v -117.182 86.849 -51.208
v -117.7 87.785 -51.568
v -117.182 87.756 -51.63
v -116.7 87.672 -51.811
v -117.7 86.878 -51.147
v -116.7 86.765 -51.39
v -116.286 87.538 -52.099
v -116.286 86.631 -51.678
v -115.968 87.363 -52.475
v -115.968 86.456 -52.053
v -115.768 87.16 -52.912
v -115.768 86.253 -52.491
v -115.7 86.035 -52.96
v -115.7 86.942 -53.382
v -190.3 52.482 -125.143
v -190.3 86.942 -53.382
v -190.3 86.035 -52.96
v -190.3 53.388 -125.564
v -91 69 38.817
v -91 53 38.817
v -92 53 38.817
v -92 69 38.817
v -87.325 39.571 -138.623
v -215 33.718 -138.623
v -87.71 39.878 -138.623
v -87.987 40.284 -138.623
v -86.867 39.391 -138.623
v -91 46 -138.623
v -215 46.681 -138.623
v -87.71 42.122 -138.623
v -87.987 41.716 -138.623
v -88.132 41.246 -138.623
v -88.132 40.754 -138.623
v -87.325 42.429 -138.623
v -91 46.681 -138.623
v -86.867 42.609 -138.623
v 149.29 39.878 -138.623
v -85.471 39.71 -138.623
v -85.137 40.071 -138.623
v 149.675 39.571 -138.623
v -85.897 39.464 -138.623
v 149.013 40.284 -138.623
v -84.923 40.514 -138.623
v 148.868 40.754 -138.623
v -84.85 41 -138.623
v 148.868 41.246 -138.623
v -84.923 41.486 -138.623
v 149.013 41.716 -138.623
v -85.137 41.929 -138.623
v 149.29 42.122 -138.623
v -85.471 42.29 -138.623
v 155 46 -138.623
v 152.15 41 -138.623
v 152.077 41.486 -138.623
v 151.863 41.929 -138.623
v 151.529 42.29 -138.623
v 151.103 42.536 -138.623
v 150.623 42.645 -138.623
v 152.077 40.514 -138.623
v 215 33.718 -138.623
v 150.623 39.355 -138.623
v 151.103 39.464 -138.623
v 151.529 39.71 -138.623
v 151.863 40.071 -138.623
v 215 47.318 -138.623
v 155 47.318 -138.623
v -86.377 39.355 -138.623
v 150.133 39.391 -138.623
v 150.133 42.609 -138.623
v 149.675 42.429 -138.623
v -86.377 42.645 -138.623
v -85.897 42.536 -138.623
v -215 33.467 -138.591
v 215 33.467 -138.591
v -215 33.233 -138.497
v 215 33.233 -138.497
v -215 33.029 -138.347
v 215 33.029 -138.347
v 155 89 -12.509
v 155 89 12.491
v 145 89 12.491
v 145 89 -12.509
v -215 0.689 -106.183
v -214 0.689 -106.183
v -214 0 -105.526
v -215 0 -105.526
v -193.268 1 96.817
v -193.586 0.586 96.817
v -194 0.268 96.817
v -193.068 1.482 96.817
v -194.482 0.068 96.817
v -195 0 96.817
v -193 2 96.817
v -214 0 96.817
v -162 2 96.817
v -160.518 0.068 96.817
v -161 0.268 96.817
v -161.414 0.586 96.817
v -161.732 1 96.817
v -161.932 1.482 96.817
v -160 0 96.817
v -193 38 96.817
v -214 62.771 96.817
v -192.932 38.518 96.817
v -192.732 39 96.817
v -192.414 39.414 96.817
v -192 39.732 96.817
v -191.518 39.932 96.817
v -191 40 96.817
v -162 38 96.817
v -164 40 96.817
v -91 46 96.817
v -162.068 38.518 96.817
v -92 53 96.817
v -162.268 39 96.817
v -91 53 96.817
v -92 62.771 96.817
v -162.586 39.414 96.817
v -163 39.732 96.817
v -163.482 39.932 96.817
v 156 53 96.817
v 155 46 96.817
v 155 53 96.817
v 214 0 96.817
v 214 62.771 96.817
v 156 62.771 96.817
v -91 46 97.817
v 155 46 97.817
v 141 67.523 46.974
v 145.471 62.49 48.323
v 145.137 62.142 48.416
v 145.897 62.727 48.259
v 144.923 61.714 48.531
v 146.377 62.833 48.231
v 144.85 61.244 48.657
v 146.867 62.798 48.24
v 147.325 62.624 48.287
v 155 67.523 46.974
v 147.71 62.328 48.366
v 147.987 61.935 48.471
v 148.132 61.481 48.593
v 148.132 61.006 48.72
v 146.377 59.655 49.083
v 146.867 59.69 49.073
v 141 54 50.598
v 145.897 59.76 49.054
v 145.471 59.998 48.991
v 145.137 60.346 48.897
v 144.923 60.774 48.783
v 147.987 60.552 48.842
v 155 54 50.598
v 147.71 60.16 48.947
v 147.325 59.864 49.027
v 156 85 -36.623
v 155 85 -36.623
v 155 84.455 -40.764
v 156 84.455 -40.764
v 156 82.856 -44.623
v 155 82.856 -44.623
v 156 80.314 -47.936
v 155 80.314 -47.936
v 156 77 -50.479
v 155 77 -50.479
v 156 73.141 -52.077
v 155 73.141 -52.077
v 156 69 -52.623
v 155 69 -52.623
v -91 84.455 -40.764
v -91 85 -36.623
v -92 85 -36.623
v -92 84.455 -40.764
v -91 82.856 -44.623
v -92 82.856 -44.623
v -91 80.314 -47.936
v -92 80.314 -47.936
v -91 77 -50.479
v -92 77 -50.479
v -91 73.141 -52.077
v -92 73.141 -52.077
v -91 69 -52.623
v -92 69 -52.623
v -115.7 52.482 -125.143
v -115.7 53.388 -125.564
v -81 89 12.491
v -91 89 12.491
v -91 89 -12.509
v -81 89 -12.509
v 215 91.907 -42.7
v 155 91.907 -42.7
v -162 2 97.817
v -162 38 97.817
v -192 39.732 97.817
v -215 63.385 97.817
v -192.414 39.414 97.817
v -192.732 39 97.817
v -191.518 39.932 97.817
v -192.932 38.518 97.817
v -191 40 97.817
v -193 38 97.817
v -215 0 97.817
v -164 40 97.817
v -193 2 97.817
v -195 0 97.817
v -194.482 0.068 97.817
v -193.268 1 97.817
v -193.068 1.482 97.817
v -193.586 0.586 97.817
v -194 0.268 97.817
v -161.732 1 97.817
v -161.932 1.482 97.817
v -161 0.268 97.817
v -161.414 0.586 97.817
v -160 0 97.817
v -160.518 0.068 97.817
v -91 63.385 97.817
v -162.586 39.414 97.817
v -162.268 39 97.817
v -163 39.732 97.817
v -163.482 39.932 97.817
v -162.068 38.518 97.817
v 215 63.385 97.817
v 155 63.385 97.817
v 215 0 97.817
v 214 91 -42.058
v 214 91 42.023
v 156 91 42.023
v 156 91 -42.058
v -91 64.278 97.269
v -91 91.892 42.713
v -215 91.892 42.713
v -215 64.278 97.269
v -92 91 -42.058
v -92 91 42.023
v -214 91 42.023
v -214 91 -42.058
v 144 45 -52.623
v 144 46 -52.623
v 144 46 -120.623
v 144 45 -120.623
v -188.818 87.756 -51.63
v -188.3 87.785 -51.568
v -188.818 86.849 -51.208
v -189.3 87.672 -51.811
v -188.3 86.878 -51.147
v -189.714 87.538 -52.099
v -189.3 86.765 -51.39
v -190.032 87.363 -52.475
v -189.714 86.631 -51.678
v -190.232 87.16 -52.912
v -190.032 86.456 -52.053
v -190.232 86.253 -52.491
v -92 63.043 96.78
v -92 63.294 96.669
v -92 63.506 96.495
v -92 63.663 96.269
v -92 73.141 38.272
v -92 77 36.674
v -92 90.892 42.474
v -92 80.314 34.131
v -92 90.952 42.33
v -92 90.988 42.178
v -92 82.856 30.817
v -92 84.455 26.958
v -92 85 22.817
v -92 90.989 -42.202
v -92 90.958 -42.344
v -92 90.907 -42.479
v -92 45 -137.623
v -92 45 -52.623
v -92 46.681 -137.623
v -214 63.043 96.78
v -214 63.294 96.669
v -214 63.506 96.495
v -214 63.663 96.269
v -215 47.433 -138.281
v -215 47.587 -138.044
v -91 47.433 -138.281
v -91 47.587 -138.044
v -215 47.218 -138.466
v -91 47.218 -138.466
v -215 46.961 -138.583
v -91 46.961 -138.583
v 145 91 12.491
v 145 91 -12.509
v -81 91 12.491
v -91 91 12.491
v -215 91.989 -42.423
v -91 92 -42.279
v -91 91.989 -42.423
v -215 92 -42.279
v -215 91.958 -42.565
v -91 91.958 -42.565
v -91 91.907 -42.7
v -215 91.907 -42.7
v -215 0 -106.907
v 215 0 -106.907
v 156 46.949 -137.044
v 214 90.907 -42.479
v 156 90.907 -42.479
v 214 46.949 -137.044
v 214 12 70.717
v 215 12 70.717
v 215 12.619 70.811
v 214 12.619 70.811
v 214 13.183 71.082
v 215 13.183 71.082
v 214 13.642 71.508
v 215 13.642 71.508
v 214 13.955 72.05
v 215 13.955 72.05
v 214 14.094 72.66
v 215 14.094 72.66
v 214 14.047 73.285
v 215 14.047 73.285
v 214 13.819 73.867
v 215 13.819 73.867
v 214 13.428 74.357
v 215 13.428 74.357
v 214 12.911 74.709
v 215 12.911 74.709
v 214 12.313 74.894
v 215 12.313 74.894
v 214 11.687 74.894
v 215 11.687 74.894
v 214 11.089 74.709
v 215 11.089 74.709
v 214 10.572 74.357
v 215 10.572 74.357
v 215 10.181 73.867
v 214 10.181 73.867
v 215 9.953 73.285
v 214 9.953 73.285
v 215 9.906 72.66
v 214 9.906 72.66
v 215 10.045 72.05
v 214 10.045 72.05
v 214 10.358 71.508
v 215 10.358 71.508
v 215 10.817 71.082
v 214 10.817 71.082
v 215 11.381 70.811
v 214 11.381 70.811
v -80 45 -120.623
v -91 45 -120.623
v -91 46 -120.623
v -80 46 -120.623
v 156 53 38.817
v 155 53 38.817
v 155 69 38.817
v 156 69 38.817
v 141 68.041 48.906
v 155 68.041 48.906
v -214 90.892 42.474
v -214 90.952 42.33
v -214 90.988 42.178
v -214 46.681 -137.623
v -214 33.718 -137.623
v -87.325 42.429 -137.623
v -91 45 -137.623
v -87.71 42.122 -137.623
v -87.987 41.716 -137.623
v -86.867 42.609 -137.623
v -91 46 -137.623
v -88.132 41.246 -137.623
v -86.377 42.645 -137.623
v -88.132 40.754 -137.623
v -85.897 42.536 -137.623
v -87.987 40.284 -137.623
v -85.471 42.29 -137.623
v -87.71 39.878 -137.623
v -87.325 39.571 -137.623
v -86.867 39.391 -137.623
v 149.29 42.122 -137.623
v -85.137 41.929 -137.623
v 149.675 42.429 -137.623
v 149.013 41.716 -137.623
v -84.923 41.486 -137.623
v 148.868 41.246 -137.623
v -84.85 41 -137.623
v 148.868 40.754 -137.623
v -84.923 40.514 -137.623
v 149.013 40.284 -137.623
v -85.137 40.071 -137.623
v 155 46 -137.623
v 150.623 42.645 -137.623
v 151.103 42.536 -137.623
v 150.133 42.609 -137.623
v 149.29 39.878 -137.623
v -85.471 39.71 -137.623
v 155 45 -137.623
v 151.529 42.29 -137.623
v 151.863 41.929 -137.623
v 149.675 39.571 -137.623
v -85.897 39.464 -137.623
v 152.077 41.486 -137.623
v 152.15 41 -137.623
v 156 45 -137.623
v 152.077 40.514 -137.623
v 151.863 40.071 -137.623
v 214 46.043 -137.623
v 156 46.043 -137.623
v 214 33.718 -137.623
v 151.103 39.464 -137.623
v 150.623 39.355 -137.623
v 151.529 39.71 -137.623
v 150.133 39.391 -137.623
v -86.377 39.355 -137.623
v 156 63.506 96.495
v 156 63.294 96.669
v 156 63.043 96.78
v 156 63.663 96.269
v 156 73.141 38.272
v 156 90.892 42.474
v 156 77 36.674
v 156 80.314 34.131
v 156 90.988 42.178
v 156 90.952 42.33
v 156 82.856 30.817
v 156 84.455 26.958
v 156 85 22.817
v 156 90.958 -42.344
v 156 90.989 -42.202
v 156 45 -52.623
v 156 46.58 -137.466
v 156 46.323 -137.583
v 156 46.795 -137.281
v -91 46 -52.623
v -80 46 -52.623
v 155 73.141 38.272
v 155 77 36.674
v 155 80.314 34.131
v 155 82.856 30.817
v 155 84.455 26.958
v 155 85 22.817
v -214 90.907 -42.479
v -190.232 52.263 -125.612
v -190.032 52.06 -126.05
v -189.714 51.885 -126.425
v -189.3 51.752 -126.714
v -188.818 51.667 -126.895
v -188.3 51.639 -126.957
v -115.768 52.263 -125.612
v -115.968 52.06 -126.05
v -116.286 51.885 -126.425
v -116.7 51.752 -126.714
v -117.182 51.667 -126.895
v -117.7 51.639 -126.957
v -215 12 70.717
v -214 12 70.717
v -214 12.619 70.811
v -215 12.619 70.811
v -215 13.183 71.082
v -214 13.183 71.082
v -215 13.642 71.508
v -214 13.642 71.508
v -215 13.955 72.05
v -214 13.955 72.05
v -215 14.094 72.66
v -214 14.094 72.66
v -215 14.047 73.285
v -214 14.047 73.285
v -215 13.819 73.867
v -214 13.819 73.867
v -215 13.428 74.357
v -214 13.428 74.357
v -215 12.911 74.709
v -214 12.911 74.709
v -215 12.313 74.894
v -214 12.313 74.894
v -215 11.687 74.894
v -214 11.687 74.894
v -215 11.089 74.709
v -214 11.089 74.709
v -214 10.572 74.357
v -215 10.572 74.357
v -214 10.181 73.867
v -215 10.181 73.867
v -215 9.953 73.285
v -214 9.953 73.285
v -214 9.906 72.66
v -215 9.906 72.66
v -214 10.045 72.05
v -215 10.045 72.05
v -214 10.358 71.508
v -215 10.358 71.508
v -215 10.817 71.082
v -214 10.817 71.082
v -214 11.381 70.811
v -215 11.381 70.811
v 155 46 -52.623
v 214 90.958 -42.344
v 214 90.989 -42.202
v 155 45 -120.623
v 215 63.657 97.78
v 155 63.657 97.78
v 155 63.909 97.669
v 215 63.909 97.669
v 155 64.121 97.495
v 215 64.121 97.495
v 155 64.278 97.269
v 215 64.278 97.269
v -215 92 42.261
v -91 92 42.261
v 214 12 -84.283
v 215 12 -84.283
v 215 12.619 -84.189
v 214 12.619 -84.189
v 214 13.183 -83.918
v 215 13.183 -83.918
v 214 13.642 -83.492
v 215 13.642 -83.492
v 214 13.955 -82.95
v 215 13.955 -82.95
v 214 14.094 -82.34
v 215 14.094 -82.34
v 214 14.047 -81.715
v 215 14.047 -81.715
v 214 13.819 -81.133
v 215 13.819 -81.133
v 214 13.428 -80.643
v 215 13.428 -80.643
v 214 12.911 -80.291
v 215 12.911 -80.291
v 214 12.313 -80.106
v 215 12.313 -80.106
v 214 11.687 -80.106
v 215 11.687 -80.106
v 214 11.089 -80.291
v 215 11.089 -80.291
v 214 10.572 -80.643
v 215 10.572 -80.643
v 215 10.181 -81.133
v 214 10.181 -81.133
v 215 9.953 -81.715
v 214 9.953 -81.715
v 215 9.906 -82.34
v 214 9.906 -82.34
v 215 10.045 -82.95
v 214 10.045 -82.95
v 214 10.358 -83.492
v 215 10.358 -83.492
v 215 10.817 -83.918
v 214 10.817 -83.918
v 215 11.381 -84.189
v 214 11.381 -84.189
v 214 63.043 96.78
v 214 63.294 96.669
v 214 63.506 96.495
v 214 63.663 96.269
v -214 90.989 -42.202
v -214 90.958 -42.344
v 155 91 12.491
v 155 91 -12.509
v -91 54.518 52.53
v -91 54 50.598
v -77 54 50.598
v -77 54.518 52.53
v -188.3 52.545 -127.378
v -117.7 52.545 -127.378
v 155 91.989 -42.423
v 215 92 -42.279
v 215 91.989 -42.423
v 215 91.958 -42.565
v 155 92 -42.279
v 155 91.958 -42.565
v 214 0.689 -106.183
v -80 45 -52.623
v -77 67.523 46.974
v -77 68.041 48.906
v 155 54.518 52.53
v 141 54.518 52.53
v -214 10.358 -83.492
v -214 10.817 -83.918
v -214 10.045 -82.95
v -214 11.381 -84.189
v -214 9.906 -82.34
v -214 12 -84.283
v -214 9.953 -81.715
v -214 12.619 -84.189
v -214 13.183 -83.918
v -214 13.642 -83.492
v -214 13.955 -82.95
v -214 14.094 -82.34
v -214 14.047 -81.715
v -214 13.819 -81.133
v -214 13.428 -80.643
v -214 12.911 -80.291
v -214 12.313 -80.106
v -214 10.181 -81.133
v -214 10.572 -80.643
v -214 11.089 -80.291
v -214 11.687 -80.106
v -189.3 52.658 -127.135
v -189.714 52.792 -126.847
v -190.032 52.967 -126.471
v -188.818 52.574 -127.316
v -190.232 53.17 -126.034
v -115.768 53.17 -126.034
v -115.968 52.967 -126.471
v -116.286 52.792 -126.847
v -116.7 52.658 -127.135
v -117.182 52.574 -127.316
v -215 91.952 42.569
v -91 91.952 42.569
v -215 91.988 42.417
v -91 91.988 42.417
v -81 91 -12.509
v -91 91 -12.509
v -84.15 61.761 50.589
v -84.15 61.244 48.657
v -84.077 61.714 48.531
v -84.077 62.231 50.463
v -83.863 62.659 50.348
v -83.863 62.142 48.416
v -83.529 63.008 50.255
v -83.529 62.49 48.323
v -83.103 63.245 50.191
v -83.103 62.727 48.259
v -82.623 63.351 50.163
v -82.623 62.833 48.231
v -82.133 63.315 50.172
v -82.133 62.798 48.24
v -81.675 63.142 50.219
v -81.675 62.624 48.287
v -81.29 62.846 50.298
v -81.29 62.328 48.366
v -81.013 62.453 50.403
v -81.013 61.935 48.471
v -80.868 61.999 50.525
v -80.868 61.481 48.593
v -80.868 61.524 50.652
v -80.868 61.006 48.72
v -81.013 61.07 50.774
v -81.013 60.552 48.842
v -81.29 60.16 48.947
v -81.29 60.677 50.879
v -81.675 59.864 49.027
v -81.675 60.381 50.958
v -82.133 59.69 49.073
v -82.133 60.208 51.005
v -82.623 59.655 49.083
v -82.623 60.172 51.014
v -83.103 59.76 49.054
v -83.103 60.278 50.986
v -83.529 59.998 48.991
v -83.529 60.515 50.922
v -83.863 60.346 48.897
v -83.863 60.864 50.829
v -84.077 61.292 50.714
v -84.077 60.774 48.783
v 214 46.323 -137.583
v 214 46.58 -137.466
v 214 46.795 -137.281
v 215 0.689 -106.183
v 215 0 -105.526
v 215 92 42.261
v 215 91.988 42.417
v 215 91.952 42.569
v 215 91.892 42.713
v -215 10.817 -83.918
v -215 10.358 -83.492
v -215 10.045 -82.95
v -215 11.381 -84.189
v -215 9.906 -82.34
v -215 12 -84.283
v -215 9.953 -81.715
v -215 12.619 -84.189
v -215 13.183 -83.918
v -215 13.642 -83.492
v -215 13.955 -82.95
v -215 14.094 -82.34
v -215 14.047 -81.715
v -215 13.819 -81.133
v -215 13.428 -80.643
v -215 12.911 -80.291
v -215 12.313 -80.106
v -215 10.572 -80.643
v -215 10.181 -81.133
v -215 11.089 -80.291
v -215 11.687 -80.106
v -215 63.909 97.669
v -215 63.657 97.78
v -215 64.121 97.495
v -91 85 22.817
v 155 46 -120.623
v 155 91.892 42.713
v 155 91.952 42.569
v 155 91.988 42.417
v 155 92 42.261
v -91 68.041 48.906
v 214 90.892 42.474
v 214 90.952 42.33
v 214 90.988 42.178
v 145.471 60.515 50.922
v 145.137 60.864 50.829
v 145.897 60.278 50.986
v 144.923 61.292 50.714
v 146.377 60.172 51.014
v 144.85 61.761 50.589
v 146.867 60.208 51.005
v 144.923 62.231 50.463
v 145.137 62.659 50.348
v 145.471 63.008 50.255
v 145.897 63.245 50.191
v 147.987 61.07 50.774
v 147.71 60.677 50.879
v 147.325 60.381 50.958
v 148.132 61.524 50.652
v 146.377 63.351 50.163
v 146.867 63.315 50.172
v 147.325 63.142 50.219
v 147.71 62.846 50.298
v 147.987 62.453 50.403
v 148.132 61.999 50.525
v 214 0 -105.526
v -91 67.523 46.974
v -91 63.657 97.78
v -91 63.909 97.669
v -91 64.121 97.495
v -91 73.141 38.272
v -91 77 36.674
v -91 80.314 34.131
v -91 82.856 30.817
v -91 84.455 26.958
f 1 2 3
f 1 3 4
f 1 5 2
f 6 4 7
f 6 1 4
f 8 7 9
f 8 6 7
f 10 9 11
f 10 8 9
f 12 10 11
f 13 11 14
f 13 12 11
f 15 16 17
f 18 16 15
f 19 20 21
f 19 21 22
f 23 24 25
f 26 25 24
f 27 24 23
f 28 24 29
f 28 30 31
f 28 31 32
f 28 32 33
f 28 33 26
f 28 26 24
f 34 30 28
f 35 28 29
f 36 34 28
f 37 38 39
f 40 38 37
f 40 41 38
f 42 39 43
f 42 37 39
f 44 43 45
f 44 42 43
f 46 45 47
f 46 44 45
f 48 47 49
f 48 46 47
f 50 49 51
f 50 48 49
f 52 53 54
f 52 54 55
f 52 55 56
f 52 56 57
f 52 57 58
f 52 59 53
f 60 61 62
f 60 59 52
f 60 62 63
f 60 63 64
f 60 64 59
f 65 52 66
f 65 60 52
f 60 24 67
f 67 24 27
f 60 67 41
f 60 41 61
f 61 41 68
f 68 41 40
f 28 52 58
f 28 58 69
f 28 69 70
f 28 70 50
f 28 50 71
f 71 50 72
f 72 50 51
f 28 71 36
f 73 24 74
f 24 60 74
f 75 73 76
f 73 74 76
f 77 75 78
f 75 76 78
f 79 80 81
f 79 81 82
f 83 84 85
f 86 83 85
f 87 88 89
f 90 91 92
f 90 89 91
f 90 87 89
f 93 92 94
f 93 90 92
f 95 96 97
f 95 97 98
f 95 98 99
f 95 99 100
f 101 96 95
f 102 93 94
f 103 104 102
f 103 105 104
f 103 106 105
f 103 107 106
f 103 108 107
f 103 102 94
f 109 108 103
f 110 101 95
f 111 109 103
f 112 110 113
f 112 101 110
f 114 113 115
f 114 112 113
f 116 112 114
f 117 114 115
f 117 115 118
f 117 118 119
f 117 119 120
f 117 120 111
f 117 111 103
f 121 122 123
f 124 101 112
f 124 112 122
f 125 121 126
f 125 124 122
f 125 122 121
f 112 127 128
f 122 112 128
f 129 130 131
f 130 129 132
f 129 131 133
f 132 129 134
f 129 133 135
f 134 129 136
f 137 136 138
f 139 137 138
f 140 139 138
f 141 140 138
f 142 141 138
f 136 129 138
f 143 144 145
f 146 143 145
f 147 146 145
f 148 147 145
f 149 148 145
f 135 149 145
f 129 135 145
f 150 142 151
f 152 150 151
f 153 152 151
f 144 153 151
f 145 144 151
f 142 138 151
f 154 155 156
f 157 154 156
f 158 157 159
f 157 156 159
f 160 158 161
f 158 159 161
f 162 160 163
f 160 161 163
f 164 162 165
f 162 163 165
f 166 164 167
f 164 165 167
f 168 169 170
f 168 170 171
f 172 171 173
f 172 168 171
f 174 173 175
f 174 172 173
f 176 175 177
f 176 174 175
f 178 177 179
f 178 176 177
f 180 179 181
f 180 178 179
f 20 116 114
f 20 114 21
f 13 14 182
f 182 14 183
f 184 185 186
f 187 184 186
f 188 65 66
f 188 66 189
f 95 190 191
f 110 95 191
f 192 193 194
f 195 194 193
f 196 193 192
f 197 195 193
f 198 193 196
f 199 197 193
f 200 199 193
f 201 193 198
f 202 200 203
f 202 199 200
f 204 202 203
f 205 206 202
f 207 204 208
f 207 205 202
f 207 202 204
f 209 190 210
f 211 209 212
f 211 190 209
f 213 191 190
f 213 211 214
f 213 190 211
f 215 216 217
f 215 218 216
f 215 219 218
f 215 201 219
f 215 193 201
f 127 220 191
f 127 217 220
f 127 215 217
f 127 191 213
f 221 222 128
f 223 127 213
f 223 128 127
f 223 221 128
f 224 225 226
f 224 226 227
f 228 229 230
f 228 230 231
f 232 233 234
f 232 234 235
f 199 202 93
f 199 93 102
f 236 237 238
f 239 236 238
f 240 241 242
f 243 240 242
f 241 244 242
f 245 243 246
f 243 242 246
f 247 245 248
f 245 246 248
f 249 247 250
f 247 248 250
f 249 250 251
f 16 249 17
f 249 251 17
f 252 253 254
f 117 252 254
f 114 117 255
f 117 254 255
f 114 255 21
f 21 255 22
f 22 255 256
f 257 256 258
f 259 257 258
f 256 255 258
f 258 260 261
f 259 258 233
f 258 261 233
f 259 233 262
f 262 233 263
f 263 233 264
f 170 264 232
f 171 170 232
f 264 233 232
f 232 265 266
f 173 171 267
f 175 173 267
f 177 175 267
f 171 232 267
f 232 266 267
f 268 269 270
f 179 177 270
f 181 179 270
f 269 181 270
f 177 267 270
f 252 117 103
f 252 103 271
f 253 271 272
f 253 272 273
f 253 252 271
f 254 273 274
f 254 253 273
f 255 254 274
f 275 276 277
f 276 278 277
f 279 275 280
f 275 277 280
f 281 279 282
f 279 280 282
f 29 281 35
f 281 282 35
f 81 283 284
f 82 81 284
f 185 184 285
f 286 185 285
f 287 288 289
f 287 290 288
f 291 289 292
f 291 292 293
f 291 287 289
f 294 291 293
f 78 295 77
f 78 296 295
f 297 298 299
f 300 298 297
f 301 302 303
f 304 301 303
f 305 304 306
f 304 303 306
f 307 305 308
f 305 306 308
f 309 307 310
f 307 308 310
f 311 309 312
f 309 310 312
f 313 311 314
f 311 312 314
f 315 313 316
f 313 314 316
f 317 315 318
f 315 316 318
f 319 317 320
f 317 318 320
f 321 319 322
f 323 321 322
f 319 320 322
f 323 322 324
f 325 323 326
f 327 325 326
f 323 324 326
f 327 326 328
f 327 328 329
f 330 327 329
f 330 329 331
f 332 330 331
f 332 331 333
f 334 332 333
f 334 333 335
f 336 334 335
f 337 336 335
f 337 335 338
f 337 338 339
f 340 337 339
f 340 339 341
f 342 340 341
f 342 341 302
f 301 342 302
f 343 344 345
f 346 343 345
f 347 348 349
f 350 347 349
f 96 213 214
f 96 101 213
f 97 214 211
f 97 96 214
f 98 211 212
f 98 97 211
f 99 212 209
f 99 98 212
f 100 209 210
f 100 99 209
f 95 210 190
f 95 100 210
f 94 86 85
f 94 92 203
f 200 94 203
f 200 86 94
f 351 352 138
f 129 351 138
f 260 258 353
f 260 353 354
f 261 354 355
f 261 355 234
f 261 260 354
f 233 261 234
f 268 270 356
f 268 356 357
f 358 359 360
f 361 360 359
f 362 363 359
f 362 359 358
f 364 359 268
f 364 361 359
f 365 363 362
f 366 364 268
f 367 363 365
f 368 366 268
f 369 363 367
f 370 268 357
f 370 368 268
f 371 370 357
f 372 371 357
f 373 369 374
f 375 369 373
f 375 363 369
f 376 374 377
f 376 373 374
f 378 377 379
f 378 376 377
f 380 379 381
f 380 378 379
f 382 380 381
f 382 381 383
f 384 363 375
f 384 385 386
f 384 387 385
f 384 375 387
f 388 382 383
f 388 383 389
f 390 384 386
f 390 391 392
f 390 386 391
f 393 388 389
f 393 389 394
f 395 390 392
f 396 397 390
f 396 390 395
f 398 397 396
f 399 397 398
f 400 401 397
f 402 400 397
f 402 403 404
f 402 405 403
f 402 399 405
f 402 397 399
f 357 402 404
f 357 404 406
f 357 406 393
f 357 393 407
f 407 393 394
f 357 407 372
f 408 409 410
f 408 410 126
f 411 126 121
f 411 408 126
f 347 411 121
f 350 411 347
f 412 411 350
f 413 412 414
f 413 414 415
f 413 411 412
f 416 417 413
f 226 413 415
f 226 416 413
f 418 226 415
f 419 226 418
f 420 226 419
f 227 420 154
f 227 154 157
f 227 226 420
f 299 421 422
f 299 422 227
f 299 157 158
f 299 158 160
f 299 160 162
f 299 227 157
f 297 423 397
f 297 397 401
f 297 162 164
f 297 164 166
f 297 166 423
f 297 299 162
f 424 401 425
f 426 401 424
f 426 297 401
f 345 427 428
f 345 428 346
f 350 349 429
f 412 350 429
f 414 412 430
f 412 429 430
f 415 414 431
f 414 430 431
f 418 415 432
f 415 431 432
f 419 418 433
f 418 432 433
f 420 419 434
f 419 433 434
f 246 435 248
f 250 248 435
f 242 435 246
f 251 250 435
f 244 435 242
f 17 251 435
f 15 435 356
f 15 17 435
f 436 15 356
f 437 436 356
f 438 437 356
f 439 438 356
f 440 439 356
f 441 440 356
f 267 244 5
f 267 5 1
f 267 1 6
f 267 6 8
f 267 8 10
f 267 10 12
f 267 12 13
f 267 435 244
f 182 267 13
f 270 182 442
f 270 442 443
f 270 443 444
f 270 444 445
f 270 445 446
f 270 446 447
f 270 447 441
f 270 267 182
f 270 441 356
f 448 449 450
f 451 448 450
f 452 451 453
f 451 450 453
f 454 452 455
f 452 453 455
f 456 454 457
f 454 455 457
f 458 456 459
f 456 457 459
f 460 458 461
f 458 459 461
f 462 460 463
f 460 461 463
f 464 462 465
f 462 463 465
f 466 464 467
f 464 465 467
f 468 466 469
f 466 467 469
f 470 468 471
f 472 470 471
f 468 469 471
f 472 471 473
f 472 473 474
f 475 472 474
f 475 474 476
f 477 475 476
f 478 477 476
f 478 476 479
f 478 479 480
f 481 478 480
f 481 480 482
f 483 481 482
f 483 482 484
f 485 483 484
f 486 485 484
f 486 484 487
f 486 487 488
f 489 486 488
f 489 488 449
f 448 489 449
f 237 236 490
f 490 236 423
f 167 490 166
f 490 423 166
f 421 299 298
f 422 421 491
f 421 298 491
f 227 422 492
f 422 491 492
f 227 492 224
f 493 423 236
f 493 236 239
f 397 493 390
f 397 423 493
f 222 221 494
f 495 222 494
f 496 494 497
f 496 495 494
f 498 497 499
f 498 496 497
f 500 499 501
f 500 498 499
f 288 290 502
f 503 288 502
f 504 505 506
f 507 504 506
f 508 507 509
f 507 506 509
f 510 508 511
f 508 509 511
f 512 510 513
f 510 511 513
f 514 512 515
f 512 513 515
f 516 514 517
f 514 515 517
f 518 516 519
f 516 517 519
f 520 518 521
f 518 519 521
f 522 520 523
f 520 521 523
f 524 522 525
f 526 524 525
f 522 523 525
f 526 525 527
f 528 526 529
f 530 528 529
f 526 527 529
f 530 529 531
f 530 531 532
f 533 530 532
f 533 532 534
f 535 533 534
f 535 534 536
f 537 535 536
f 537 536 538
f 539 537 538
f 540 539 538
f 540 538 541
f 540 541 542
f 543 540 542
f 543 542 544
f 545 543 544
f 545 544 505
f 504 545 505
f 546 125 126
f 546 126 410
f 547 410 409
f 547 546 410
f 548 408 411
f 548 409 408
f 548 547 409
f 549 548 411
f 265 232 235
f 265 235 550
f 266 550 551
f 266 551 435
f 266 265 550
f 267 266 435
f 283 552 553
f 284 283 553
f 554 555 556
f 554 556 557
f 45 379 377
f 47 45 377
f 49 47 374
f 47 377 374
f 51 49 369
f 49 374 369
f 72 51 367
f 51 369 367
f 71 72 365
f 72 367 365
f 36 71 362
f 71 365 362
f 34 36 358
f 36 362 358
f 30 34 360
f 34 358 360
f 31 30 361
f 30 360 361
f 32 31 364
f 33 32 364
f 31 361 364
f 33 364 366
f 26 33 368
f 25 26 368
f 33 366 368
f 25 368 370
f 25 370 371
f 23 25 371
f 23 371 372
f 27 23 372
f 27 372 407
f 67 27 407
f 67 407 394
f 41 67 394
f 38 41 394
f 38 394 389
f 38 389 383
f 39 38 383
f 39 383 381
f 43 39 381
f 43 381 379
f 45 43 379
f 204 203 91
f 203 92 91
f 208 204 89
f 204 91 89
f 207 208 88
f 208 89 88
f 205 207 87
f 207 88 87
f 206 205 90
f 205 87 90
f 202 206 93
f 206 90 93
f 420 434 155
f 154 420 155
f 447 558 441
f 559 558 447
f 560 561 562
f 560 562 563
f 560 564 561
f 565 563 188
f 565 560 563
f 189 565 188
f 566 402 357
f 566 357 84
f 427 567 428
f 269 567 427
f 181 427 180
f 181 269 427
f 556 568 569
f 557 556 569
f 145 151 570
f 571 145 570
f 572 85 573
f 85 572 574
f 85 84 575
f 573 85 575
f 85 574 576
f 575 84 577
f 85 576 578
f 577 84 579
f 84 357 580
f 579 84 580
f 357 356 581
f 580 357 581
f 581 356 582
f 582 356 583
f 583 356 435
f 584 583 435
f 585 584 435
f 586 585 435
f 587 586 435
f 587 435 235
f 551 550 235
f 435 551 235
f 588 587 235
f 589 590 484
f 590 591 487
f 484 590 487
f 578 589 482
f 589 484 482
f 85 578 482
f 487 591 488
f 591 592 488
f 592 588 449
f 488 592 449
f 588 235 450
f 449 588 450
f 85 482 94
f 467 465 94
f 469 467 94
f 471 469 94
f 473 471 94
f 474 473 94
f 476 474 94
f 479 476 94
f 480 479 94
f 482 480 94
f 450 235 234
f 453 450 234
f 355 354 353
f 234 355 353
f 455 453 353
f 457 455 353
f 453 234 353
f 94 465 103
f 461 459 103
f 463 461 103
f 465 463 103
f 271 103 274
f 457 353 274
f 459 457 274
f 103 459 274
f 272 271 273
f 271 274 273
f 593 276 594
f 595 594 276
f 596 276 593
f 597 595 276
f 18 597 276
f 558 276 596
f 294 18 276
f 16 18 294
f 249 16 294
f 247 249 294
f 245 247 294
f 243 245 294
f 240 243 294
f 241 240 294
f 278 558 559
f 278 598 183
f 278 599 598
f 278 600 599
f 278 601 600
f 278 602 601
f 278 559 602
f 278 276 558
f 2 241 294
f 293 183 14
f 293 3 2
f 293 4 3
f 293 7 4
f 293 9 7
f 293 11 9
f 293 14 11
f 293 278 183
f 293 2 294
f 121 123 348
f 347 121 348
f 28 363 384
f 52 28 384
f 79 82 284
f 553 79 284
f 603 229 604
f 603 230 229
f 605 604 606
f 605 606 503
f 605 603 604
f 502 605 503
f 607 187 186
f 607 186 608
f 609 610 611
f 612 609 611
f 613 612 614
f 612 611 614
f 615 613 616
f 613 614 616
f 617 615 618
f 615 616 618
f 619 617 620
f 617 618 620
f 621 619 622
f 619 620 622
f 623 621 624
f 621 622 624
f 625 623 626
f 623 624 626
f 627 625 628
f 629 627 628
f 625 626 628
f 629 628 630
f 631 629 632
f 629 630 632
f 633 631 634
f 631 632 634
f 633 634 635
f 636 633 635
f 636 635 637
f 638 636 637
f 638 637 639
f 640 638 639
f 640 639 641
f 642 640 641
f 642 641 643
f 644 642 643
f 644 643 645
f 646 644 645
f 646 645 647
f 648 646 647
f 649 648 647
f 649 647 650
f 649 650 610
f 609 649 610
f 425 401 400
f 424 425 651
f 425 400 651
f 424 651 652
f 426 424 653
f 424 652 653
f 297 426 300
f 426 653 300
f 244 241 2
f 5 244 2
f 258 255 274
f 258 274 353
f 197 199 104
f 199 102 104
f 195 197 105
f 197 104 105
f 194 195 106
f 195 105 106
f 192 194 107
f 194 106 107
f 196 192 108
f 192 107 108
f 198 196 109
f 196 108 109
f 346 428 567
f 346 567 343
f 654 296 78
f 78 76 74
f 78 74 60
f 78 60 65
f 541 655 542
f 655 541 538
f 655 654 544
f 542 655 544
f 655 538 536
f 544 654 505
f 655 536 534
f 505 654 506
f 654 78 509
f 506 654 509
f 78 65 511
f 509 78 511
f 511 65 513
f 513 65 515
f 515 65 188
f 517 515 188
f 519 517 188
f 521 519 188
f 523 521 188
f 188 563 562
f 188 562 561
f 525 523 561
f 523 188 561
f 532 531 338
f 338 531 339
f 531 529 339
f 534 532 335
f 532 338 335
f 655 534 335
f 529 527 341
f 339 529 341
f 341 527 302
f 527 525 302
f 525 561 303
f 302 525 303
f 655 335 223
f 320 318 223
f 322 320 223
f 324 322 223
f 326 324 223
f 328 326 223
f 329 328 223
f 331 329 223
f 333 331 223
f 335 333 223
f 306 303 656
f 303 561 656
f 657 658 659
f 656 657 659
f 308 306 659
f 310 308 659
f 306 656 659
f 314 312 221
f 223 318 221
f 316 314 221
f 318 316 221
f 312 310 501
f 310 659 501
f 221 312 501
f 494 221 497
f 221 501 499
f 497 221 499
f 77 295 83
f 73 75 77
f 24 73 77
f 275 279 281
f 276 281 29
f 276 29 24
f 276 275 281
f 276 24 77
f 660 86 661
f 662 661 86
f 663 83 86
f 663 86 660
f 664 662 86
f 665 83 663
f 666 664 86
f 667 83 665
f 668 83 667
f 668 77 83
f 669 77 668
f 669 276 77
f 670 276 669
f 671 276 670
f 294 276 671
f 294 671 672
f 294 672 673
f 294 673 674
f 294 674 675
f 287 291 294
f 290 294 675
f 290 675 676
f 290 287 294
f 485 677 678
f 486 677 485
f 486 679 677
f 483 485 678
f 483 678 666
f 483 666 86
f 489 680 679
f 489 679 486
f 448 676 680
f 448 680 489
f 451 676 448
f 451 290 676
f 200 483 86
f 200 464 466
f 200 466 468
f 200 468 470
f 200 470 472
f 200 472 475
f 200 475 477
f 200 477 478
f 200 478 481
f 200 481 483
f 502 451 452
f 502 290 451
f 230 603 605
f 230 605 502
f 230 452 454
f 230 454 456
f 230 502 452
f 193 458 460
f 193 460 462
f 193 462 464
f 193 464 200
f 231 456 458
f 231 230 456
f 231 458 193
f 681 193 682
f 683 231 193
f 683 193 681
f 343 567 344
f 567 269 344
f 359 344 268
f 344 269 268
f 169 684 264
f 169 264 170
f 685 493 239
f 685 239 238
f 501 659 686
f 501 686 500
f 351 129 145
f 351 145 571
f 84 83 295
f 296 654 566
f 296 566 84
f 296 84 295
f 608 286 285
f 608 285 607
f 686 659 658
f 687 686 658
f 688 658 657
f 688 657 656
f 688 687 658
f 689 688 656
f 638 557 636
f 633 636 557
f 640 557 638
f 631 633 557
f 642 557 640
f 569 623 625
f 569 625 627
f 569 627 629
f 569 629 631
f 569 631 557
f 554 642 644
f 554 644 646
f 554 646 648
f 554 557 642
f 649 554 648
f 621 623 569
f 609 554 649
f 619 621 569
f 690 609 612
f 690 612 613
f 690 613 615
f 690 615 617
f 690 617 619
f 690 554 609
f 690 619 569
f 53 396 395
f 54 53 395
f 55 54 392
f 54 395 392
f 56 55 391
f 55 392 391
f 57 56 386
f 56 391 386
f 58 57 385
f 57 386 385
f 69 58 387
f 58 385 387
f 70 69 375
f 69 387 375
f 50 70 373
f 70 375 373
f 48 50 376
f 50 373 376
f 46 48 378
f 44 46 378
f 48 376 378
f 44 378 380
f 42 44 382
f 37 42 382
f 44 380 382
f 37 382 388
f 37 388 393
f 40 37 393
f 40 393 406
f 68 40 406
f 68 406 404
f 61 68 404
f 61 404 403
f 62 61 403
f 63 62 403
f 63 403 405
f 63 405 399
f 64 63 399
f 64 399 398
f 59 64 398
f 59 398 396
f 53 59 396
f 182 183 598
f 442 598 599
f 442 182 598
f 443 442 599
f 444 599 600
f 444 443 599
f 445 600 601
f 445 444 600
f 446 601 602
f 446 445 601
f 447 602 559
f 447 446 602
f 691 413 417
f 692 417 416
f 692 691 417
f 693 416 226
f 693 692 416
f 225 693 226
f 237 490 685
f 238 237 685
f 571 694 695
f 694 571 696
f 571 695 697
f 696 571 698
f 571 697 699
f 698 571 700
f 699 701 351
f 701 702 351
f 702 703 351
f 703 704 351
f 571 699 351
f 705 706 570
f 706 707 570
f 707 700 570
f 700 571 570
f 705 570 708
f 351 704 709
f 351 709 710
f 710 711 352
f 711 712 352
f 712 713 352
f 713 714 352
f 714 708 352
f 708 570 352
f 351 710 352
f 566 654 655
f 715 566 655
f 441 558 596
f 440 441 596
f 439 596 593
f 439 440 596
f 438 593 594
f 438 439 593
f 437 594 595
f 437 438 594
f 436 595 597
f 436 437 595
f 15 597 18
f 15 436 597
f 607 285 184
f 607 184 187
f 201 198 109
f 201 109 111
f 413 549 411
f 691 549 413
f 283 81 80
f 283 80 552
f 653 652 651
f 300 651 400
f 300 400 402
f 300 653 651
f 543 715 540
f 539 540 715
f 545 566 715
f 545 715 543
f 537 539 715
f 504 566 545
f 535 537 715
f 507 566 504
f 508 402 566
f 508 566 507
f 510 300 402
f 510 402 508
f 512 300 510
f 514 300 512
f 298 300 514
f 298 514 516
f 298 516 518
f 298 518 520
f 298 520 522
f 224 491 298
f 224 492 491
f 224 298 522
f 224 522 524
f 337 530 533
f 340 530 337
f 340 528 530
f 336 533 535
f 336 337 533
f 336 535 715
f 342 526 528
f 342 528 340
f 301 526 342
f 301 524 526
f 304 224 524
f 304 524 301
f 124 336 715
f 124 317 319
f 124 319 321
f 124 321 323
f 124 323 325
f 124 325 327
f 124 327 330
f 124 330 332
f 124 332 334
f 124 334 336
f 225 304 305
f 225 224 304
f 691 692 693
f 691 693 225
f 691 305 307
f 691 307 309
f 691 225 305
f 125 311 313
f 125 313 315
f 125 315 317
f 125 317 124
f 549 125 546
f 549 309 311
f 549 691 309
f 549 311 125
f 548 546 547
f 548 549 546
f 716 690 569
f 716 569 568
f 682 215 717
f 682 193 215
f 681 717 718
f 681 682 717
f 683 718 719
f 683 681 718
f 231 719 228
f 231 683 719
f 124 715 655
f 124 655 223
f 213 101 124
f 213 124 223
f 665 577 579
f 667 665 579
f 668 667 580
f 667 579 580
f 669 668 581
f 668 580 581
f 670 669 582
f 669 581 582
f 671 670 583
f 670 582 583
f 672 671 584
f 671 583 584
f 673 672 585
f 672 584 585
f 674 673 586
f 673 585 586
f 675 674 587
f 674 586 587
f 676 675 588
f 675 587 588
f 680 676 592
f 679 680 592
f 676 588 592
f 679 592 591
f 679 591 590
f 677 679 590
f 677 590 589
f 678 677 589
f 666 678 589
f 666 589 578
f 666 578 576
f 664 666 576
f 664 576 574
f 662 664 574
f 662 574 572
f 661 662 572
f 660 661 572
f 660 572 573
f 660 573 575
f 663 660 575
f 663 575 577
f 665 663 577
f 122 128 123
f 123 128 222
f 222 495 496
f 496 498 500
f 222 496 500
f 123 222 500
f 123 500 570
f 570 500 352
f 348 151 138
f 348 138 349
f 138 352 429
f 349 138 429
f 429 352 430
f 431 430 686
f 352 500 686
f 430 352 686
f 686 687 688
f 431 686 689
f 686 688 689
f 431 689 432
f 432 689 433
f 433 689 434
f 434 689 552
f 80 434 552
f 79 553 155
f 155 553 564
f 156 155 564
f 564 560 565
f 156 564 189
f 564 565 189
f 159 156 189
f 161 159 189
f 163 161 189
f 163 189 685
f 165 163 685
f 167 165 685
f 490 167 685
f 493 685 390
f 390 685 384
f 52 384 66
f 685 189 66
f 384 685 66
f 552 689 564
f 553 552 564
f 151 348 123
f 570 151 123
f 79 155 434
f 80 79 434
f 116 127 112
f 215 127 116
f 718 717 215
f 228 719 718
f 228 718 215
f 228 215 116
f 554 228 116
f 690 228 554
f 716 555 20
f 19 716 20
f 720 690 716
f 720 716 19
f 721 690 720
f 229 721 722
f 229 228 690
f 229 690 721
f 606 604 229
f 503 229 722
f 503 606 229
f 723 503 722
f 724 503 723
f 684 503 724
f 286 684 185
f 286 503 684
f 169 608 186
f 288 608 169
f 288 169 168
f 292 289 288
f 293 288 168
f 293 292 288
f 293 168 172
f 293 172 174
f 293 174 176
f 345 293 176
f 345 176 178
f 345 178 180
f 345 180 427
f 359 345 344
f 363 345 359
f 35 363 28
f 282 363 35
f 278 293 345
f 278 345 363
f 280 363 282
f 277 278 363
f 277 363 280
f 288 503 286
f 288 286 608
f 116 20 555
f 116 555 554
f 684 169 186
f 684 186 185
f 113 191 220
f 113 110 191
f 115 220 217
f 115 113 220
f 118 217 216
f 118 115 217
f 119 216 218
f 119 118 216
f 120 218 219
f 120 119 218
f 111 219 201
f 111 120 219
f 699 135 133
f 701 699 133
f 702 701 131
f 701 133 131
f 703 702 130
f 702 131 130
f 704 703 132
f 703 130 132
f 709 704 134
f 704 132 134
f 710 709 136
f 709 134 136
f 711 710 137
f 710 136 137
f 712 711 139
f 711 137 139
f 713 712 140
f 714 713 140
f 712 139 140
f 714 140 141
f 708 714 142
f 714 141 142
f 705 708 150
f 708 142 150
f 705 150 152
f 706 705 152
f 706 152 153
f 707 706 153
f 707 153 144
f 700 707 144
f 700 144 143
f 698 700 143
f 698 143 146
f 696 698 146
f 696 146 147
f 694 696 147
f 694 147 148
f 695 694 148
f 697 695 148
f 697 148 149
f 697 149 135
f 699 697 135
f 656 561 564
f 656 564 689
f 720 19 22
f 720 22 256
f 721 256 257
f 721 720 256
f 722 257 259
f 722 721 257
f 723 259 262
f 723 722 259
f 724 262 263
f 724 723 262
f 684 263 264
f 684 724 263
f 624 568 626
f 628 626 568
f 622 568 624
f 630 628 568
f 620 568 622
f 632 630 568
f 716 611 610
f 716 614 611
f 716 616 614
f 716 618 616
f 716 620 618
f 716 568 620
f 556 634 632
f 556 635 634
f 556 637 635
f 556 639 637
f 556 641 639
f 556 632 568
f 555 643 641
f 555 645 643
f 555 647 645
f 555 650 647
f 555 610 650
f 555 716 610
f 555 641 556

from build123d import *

# Parameters (mm, degrees)
EXTRUDE_1_DEPTH         = 215
EXTRUDE_2_DEPTH         = 1
EXTRUDE_3_DEPTH         = 1
SKETCH_4_W              = 246
SKETCH_4_H              = 137.991605588
CUT_EXTRUDE_1_DEPTH     = 333.555002245
CUT_EXTRUDE_2_REACH     = 274.801
SKETCH_5_W              = 74.6
SKETCH_5_H              = 83.6
FILLET_1_R              = 2
CUT_EXTRUDE_3_REACH     = 334.555
SKETCH_7_W              = 31
SKETCH_7_H              = 40
FILLET_2_R              = 2
FILLET_3_R              = 1
HOLE_WIZARD_M41_D       = 4.2
EXTRUDE_4_DEPTH         = 1
SKETCH_14_W             = 68
SKETCH_14_H             = 1
EXTRUDE_5_DEPTH         = 11
SKETCH_15_W             = 25
SKETCH_15_H             = 2
EXTRUDE_6_DEPTH         = 10
EXTRUDE_7_DEPTH         = 14
HOLE_WIZARD_M41_2_D     = 3.3
HOLE_WIZARD_M41_2_DEPTH = 1
HOLE_WIZARD_M42_D       = 3.3
HOLE_WIZARD_M42_DEPTH   = 2


with BuildPart() as part:
    # Эскиз1 → Бобышка-Вытянуть1 (new, symmetric)
    with BuildSketch(Plane(origin=(0, 0, 0), x_dir=(0, 0, -1), z_dir=(1, 0, 0))):
        Polygon((-97.817266744, 64), (-97.817266744, 0), (-96.817266744, 0), (-96.817266744, 63.385363703), (-42.261330955, 91), (42.278938578, 91), (137.622640037, 46.680562515), (137.622640037, 33.718332981), (106.182733256, 0.68946939), (106.907048077, 0), (138.622640037, 33.318481758), (138.622640037, 47.318481758), (42.5, 92), (-42.5, 92), align=None)
    extrude(amount=EXTRUDE_1_DEPTH, both=True)

    # Эскиз2 → Бобышка-Вытянуть2 (add)
    with BuildSketch(Plane(origin=(215, 0, 0), x_dir=(0, 0, -1), z_dir=(1, 0, 0))):
        Polygon((-96.817266744, 0), (-96.817266744, 63.385363703), (-42.261330955, 91), (42.278938578, 91), (137.622640037, 46.680562515), (137.622640037, 33.718332981), (105.526432948, 0), align=None)
    extrude(amount=-EXTRUDE_2_DEPTH)

    # Эскиз3 → Бобышка-Вытянуть3 (add)
    with BuildSketch(Plane.ZY.offset(215)):
        Polygon((96.817266744, 0), (96.817266744, 63.385363703), (42.261330955, 91), (-42.278938578, 91), (-137.622640037, 46.680562515), (-137.622640037, 33.718332981), (-105.526432948, 0), align=None)
    extrude(amount=-EXTRUDE_3_DEPTH)

    # Эскиз4 → Вырез-Вытянуть1 (cut, through all)
    with BuildSketch(Plane.XY.offset(97.817266744)):
        with Locations((32, 114.995802794)):
            Rectangle(SKETCH_4_W, SKETCH_4_H)
    extrude(amount=-CUT_EXTRUDE_1_DEPTH, mode=Mode.SUBTRACT)

    # Эскиз5 → Вырез-Вытянуть2 (cut, up to next)
    with BuildSketch(Plane(origin=(0, 91.898645501, -42.718042324), x_dir=(1, 0, 0), z_dir=(0, 0.9068173588352332, -0.42152375699964034)), mode=Mode.PRIVATE) as cut_extrude_2_sk1:
        with Locations((-153, 51.559552107)):
            Rectangle(SKETCH_5_W, SKETCH_5_H)
    cut_extrude_2_tool1 = extrude(cut_extrude_2_sk1.sketch, amount=-CUT_EXTRUDE_2_REACH, mode=Mode.PRIVATE) & part.part
    add(cut_extrude_2_tool1.solids().sort_by_distance((-153, 70.165069, -89.473139))[0], mode=Mode.SUBTRACT)

    # Скругление1
    fillet_1_edges = [part.edges().sort_by_distance(p)[0] for p in [
        (-115.7, 52.091967665, -127.167342908),
        (-115.7, 87.331353751, -51.35741171),
        (-190.3, 87.331353751, -51.35741171),
        (-190.3, 52.091967665, -127.167342908),
    ]]
    fillet(fillet_1_edges, radius=FILLET_1_R)

    # Эскиз7 → Вырез-Вытянуть3 (cut, up to next)
    with BuildSketch(Plane.XY.offset(97.817266744), mode=Mode.PRIVATE) as cut_extrude_3_sk1:
        with Locations((-177.5, 20)):
            Rectangle(SKETCH_7_W, SKETCH_7_H)
    cut_extrude_3_tool1 = extrude(cut_extrude_3_sk1.sketch, amount=-CUT_EXTRUDE_3_REACH, mode=Mode.PRIVATE) & part.part
    add(cut_extrude_3_tool1.solids().sort_by_distance((-177.5, 20, 97.817267))[0], mode=Mode.SUBTRACT)

    # Скругление2
    fillet_2_edges = [part.edges().sort_by_distance(p)[0] for p in [
        (-162, 0, 97.317266744),
        (-162, 40, 97.317266744),
        (-193, 40, 97.317266744),
        (-193, 0, 97.317266744),
    ]]
    fillet(fillet_2_edges, radius=FILLET_2_R)

    # Скругление3
    fillet_3_edges = [part.edges().sort_by_distance(p)[0] for p in [
        (-152.5, 91, -42.278938578),
        (-152.5, 91, 42.261330955),
        (-152.5, 63.385363703, 96.817266744),
        (185, 92, 42.5),
        (185, 92, -42.5),
        (0, 33.318481758, -138.622640037),
        (185, 64, 97.817266744),
        (184.5, 46.680562515, -137.622640037),
        (184.5, 91, -42.278938578),
        (184.5, 91, 42.261330955),
        (184.5, 63.385363703, 96.817266744),
        (-153, 92, 42.5),
        (-153, 92, -42.5),
        (-153, 47.318481758, -138.622640037),
        (-153, 64, 97.817266744),
    ]]
    fillet(fillet_3_edges, radius=FILLET_3_R)

    # Hole Wizard M41 (through all)
    with Locations(Plane.ZY.offset(215)):
        with Locations((72.817266744, 12), (-82.182733256, 12)):
            Hole(HOLE_WIZARD_M41_D / 2)

    # Эскиз13 → Бобышка-Вытянуть4 (add)
    with BuildSketch(Plane(origin=(-91, 0, 0), x_dir=(0, 0, -1), z_dir=(1, 0, 0))):
        with BuildLine():
            Line((137.622640037, 45), (137.622640037, 46.680562515))
            Line((137.622640037, 46.680562515), (42.278938578, 91))
            Line((42.278938578, 91), (-42.261330955, 91))
            Line((-42.261330955, 91), (-96.817266744, 63.385363703))
            Line((-96.817266744, 63.385363703), (-96.817266744, 53))
            Line((-96.817266744, 53), (-38.817266744, 53))
            Line((-38.817266744, 53), (-38.817266744, 69))
            ThreePointArc((-38.817266744, 69), (-34.130975243, 80.313708499), (-22.817266744, 85))
            Line((-22.817266744, 85), (36.622640037, 85))
            ThreePointArc((36.622640037, 85), (47.936348536, 80.313708499), (52.622640037, 69))
            Line((52.622640037, 69), (52.622640037, 45))
            Line((52.622640037, 45), (137.622640037, 45))
        make_face()
    extrude_4 = extrude(amount=-EXTRUDE_4_DEPTH)

    # Эскиз14 → Бобышка-Вытянуть5 (add)
    with BuildSketch(Plane(origin=(-91, 0, 0), x_dir=(0, 0, -1), z_dir=(1, 0, 0))):
        with Locations((86.622640037, 45.5)):
            Rectangle(SKETCH_14_W, SKETCH_14_H)
    extrude_5 = extrude(amount=EXTRUDE_5_DEPTH)

    # Эскиз15 → Бобышка-Вытянуть6 (add)
    with BuildSketch(Plane(origin=(-91, 0, 0), x_dir=(0, 0, -1), z_dir=(1, 0, 0))):
        with Locations((0.008803811, 90)):
            Rectangle(SKETCH_15_W, SKETCH_15_H)
    extrude_6 = extrude(amount=EXTRUDE_6_DEPTH)

    # Эскиз16 → Бобышка-Вытянуть7 (add)
    with BuildSketch(Plane(origin=(-91, 0, 0), x_dir=(0, 0, -1), z_dir=(1, 0, 0))):
        Polygon((-52.529527952, 54.51763809), (-48.906061321, 68.040599658), (-46.974209668, 67.522961568), (-50.5976763, 54), align=None)
    extrude_7 = extrude(amount=EXTRUDE_7_DEPTH)

    # Зеркальное отражение1: Бобышка-Вытянуть4, Бобышка-Вытянуть5, Бобышка-Вытянуть6, Бобышка-Вытянуть7 across plane
    add(extrude_4.mirror(Plane(origin=(32, 0, 0), x_dir=(0, 0, 1), z_dir=(1, 0, 0))))
    add(extrude_5.mirror(Plane(origin=(32, 0, 0), x_dir=(0, 0, 1), z_dir=(1, 0, 0))))
    add(extrude_6.mirror(Plane(origin=(32, 0, 0), x_dir=(0, 0, 1), z_dir=(1, 0, 0))))
    add(extrude_7.mirror(Plane(origin=(32, 0, 0), x_dir=(0, 0, 1), z_dir=(1, 0, 0))))

    # Hole Wizard M41 2
    with Locations(Plane(origin=(0, 0, -138.622640037), x_dir=(-1, 0, 0), z_dir=(0, 0, -1))):
        with Locations((-150.5, 41), (86.5, 41)):
            Hole(HOLE_WIZARD_M41_2_D / 2, depth=HOLE_WIZARD_M41_2_DEPTH)

    # Отверстие обработанное метчиком M42
    with Locations(Plane(origin=(0, 16.784371263, 62.640126326), x_dir=(1, 0, 0), z_dir=(0, 0.2588190451025141, 0.9659258262890702))):
        with Locations((-82.5, 46.563730151), (146.5, 46.563730151)):
            Hole(HOLE_WIZARD_M42_D / 2, depth=HOLE_WIZARD_M42_DEPTH)


solid = part.part
